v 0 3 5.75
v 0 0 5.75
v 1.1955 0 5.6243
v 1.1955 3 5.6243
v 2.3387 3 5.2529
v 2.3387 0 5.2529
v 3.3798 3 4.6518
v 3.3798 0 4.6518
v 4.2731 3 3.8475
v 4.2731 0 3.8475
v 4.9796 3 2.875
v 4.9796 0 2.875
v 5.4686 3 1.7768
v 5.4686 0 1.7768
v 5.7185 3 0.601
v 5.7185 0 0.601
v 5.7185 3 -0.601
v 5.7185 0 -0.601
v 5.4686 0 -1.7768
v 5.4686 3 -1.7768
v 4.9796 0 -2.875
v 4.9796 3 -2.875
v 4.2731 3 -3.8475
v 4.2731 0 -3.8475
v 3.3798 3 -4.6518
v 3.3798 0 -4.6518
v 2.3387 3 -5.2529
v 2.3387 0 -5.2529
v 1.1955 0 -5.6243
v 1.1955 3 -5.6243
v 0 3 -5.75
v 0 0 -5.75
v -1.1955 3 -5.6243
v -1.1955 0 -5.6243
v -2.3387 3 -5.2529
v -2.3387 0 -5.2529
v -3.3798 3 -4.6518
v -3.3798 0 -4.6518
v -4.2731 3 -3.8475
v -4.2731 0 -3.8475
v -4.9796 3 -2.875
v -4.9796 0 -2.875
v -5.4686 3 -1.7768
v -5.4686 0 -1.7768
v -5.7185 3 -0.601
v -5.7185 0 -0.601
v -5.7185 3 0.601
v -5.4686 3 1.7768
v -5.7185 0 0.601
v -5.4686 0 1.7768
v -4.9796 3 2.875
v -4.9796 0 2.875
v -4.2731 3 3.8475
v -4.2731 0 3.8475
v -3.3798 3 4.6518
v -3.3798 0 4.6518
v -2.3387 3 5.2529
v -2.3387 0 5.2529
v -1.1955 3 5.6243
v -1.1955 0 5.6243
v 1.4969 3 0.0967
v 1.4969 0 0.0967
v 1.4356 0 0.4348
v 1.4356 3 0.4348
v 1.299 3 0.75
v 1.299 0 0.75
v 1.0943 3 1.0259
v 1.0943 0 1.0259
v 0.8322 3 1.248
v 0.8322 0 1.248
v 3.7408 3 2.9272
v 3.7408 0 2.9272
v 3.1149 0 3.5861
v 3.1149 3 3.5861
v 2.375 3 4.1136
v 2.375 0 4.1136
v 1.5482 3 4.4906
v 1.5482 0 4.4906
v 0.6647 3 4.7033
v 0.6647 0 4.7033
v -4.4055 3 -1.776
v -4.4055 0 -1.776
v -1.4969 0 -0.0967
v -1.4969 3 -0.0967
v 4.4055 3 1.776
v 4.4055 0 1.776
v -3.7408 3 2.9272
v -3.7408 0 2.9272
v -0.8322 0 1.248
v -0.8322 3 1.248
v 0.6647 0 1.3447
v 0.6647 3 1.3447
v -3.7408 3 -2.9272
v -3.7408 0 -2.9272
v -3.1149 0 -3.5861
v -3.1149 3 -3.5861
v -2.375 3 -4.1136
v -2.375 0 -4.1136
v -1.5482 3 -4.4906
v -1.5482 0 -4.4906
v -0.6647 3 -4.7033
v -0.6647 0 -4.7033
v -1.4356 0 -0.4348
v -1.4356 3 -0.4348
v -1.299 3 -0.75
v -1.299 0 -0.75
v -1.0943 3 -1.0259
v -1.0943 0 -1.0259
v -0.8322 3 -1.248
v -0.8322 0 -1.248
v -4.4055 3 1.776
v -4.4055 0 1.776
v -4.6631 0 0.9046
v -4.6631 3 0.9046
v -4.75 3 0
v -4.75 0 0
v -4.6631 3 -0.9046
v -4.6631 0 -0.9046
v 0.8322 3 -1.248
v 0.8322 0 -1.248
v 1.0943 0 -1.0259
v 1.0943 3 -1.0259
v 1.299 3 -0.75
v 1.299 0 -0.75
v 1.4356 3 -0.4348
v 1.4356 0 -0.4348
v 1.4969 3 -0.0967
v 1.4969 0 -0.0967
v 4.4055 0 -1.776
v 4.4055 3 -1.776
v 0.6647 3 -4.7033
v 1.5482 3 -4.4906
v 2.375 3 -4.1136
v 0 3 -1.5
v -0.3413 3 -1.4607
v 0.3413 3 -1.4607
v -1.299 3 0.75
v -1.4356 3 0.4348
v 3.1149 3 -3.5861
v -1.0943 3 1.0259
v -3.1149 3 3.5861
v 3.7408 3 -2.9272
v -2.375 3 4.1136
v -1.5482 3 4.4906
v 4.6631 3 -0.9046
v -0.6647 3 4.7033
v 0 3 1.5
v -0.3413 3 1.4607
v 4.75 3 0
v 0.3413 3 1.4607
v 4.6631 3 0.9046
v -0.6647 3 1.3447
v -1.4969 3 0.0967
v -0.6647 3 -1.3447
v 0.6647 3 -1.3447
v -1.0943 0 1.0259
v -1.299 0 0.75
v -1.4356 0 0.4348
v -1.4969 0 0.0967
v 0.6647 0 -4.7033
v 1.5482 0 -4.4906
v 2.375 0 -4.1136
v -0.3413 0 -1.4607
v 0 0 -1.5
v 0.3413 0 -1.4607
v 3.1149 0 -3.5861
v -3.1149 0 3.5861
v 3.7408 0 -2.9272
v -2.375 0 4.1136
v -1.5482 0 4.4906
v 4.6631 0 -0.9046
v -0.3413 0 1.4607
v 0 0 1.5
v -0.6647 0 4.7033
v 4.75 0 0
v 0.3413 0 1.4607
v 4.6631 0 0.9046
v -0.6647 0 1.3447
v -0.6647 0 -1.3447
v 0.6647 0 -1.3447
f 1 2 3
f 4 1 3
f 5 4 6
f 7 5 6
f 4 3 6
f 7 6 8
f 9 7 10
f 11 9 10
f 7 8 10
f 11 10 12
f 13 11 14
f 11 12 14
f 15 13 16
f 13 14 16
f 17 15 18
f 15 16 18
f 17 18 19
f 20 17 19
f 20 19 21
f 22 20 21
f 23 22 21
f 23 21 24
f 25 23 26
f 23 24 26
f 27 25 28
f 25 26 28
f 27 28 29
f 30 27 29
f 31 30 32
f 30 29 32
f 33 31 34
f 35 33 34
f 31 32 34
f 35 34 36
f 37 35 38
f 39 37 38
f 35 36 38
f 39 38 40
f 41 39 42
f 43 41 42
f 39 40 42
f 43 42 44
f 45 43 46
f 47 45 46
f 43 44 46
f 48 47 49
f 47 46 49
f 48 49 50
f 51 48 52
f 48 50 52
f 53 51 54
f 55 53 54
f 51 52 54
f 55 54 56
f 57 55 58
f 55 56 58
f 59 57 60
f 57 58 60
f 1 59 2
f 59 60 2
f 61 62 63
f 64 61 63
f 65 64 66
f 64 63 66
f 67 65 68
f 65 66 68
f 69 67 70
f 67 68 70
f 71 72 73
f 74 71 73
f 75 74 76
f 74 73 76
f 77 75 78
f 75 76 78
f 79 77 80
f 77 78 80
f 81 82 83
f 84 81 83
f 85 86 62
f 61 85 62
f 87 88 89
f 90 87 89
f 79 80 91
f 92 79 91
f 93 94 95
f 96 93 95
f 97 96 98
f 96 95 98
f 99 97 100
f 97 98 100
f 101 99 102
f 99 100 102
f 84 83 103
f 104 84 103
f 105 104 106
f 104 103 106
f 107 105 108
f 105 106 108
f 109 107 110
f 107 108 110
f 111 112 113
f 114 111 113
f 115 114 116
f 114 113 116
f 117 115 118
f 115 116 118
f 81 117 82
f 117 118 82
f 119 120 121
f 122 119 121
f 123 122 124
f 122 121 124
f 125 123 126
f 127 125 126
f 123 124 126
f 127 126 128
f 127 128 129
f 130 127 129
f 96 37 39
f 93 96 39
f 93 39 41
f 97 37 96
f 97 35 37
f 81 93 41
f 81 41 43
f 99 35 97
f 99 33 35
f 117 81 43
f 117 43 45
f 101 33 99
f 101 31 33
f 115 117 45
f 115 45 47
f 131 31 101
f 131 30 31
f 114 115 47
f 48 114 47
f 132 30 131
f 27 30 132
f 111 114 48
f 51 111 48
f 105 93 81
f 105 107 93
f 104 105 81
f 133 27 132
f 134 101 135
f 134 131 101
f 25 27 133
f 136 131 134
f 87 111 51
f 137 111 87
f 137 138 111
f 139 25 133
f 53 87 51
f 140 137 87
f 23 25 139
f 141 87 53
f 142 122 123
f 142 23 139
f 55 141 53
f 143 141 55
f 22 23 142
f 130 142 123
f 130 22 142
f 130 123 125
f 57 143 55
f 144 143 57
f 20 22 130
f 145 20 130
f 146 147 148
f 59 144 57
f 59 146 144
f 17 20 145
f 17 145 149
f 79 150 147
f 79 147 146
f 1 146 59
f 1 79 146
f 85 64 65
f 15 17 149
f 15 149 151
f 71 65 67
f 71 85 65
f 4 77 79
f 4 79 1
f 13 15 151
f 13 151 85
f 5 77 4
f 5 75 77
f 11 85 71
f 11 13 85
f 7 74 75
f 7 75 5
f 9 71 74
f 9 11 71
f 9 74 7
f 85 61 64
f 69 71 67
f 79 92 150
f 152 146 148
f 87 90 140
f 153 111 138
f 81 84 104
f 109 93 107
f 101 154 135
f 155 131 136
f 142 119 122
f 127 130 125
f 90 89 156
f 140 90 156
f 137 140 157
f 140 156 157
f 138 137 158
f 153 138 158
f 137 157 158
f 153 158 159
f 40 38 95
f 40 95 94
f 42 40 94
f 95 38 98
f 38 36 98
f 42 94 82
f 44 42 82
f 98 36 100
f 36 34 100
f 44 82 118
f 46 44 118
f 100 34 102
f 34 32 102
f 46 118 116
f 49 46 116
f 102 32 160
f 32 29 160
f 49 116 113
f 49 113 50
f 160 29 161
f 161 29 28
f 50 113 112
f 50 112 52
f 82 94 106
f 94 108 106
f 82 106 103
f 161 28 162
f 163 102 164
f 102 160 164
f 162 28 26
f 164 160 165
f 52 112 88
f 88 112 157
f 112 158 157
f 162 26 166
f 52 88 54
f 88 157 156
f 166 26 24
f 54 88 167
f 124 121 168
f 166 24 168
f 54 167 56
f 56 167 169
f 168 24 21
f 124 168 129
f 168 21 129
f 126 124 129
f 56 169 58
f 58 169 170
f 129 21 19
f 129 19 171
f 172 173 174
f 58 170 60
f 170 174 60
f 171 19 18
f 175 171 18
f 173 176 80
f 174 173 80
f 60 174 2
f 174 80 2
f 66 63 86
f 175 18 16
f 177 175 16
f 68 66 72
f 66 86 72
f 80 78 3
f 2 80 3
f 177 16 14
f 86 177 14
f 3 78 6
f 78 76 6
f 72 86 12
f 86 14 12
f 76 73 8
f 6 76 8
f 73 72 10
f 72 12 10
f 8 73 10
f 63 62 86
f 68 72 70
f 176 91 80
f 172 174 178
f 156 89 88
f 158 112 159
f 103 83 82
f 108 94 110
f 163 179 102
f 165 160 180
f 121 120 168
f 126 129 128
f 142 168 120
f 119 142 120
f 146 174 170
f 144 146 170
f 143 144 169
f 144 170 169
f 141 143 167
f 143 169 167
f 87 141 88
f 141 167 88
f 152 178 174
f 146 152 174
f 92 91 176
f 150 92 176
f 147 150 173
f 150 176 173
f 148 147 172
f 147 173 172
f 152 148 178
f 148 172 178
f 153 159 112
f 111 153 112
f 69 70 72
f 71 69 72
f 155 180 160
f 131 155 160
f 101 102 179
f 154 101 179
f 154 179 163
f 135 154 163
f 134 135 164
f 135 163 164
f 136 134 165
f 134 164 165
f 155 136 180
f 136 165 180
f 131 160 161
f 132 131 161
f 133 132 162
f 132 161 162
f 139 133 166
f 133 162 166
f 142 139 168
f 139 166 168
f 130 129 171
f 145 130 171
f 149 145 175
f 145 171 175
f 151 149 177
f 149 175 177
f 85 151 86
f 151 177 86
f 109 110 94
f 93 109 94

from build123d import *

# Parameters (mm, degrees)
SKETCH1_R           = 5.75
BOSS_EXTRUDE1_DEPTH = 3


with BuildPart() as part:
    # Sketch1 → Boss-Extrude1 (new body)
    with BuildSketch(Plane(origin=(0, 0, 0), x_dir=(1, 0, 0), z_dir=(0, 1, 0))):
        with Locations(Location((0, 0, 0), (0, 0, 270))):
            Circle(SKETCH1_R)
        with BuildLine():
            ThreePointArc((1.496877193, -0.096740213), (1.299038106, -0.75), (0.832218079, -1.247963569))
            Line((0.832218079, -1.247963569), (3.740819863, -2.927245592))
            ThreePointArc((3.740819863, -2.927245592), (2.375, -4.113620668), (0.664659115, -4.703267828))
            Line((0.664659115, -4.703267828), (0.664659115, -1.344703782))
            ThreePointArc((0.664659115, -1.344703782), (0, -1.5), (-0.664659115, -1.344703782))
            Line((-0.664659115, -1.344703782), (-0.664659115, -4.703267828))
            ThreePointArc((-0.664659115, -4.703267828), (-2.375, -4.113620668), (-3.740819863, -2.927245592))
            Line((-3.740819863, -2.927245592), (-0.832218079, -1.247963569))
            ThreePointArc((-0.832218079, -1.247963569), (-1.299038106, -0.75), (-1.496877193, -0.096740213))
            Line((-1.496877193, -0.096740213), (-4.405478977, -1.776022236))
            ThreePointArc((-4.405478977, -1.776022236), (-4.75, 0), (-4.405478977, 1.776022236))
            Line((-4.405478977, 1.776022236), (-1.496877193, 0.096740213))
            ThreePointArc((-1.496877193, 0.096740213), (-1.299038106, 0.75), (-0.832218079, 1.247963569))
            Line((-0.832218079, 1.247963569), (-3.740819863, 2.927245592))
            ThreePointArc((-3.740819863, 2.927245592), (-2.375, 4.113620668), (-0.664659115, 4.703267828))
            Line((-0.664659115, 4.703267828), (-0.664659115, 1.344703782))
            ThreePointArc((-0.664659115, 1.344703782), (0, 1.5), (0.664659115, 1.344703782))
            Line((0.664659115, 1.344703782), (0.664659115, 4.703267828))
            ThreePointArc((0.664659115, 4.703267828), (2.375, 4.113620668), (3.740819863, 2.927245592))
            Line((3.740819863, 2.927245592), (0.832218079, 1.247963569))
            ThreePointArc((0.832218079, 1.247963569), (1.299038106, 0.75), (1.496877193, 0.096740213))
            Line((1.496877193, 0.096740213), (4.405478977, 1.776022236))
            ThreePointArc((4.405478977, 1.776022236), (4.75, 0), (4.405478977, -1.776022236))
            Line((4.405478977, -1.776022236), (1.496877193, -0.096740213))
        make_face(mode=Mode.SUBTRACT)
    extrude(amount=BOSS_EXTRUDE1_DEPTH)


solid = part.part
